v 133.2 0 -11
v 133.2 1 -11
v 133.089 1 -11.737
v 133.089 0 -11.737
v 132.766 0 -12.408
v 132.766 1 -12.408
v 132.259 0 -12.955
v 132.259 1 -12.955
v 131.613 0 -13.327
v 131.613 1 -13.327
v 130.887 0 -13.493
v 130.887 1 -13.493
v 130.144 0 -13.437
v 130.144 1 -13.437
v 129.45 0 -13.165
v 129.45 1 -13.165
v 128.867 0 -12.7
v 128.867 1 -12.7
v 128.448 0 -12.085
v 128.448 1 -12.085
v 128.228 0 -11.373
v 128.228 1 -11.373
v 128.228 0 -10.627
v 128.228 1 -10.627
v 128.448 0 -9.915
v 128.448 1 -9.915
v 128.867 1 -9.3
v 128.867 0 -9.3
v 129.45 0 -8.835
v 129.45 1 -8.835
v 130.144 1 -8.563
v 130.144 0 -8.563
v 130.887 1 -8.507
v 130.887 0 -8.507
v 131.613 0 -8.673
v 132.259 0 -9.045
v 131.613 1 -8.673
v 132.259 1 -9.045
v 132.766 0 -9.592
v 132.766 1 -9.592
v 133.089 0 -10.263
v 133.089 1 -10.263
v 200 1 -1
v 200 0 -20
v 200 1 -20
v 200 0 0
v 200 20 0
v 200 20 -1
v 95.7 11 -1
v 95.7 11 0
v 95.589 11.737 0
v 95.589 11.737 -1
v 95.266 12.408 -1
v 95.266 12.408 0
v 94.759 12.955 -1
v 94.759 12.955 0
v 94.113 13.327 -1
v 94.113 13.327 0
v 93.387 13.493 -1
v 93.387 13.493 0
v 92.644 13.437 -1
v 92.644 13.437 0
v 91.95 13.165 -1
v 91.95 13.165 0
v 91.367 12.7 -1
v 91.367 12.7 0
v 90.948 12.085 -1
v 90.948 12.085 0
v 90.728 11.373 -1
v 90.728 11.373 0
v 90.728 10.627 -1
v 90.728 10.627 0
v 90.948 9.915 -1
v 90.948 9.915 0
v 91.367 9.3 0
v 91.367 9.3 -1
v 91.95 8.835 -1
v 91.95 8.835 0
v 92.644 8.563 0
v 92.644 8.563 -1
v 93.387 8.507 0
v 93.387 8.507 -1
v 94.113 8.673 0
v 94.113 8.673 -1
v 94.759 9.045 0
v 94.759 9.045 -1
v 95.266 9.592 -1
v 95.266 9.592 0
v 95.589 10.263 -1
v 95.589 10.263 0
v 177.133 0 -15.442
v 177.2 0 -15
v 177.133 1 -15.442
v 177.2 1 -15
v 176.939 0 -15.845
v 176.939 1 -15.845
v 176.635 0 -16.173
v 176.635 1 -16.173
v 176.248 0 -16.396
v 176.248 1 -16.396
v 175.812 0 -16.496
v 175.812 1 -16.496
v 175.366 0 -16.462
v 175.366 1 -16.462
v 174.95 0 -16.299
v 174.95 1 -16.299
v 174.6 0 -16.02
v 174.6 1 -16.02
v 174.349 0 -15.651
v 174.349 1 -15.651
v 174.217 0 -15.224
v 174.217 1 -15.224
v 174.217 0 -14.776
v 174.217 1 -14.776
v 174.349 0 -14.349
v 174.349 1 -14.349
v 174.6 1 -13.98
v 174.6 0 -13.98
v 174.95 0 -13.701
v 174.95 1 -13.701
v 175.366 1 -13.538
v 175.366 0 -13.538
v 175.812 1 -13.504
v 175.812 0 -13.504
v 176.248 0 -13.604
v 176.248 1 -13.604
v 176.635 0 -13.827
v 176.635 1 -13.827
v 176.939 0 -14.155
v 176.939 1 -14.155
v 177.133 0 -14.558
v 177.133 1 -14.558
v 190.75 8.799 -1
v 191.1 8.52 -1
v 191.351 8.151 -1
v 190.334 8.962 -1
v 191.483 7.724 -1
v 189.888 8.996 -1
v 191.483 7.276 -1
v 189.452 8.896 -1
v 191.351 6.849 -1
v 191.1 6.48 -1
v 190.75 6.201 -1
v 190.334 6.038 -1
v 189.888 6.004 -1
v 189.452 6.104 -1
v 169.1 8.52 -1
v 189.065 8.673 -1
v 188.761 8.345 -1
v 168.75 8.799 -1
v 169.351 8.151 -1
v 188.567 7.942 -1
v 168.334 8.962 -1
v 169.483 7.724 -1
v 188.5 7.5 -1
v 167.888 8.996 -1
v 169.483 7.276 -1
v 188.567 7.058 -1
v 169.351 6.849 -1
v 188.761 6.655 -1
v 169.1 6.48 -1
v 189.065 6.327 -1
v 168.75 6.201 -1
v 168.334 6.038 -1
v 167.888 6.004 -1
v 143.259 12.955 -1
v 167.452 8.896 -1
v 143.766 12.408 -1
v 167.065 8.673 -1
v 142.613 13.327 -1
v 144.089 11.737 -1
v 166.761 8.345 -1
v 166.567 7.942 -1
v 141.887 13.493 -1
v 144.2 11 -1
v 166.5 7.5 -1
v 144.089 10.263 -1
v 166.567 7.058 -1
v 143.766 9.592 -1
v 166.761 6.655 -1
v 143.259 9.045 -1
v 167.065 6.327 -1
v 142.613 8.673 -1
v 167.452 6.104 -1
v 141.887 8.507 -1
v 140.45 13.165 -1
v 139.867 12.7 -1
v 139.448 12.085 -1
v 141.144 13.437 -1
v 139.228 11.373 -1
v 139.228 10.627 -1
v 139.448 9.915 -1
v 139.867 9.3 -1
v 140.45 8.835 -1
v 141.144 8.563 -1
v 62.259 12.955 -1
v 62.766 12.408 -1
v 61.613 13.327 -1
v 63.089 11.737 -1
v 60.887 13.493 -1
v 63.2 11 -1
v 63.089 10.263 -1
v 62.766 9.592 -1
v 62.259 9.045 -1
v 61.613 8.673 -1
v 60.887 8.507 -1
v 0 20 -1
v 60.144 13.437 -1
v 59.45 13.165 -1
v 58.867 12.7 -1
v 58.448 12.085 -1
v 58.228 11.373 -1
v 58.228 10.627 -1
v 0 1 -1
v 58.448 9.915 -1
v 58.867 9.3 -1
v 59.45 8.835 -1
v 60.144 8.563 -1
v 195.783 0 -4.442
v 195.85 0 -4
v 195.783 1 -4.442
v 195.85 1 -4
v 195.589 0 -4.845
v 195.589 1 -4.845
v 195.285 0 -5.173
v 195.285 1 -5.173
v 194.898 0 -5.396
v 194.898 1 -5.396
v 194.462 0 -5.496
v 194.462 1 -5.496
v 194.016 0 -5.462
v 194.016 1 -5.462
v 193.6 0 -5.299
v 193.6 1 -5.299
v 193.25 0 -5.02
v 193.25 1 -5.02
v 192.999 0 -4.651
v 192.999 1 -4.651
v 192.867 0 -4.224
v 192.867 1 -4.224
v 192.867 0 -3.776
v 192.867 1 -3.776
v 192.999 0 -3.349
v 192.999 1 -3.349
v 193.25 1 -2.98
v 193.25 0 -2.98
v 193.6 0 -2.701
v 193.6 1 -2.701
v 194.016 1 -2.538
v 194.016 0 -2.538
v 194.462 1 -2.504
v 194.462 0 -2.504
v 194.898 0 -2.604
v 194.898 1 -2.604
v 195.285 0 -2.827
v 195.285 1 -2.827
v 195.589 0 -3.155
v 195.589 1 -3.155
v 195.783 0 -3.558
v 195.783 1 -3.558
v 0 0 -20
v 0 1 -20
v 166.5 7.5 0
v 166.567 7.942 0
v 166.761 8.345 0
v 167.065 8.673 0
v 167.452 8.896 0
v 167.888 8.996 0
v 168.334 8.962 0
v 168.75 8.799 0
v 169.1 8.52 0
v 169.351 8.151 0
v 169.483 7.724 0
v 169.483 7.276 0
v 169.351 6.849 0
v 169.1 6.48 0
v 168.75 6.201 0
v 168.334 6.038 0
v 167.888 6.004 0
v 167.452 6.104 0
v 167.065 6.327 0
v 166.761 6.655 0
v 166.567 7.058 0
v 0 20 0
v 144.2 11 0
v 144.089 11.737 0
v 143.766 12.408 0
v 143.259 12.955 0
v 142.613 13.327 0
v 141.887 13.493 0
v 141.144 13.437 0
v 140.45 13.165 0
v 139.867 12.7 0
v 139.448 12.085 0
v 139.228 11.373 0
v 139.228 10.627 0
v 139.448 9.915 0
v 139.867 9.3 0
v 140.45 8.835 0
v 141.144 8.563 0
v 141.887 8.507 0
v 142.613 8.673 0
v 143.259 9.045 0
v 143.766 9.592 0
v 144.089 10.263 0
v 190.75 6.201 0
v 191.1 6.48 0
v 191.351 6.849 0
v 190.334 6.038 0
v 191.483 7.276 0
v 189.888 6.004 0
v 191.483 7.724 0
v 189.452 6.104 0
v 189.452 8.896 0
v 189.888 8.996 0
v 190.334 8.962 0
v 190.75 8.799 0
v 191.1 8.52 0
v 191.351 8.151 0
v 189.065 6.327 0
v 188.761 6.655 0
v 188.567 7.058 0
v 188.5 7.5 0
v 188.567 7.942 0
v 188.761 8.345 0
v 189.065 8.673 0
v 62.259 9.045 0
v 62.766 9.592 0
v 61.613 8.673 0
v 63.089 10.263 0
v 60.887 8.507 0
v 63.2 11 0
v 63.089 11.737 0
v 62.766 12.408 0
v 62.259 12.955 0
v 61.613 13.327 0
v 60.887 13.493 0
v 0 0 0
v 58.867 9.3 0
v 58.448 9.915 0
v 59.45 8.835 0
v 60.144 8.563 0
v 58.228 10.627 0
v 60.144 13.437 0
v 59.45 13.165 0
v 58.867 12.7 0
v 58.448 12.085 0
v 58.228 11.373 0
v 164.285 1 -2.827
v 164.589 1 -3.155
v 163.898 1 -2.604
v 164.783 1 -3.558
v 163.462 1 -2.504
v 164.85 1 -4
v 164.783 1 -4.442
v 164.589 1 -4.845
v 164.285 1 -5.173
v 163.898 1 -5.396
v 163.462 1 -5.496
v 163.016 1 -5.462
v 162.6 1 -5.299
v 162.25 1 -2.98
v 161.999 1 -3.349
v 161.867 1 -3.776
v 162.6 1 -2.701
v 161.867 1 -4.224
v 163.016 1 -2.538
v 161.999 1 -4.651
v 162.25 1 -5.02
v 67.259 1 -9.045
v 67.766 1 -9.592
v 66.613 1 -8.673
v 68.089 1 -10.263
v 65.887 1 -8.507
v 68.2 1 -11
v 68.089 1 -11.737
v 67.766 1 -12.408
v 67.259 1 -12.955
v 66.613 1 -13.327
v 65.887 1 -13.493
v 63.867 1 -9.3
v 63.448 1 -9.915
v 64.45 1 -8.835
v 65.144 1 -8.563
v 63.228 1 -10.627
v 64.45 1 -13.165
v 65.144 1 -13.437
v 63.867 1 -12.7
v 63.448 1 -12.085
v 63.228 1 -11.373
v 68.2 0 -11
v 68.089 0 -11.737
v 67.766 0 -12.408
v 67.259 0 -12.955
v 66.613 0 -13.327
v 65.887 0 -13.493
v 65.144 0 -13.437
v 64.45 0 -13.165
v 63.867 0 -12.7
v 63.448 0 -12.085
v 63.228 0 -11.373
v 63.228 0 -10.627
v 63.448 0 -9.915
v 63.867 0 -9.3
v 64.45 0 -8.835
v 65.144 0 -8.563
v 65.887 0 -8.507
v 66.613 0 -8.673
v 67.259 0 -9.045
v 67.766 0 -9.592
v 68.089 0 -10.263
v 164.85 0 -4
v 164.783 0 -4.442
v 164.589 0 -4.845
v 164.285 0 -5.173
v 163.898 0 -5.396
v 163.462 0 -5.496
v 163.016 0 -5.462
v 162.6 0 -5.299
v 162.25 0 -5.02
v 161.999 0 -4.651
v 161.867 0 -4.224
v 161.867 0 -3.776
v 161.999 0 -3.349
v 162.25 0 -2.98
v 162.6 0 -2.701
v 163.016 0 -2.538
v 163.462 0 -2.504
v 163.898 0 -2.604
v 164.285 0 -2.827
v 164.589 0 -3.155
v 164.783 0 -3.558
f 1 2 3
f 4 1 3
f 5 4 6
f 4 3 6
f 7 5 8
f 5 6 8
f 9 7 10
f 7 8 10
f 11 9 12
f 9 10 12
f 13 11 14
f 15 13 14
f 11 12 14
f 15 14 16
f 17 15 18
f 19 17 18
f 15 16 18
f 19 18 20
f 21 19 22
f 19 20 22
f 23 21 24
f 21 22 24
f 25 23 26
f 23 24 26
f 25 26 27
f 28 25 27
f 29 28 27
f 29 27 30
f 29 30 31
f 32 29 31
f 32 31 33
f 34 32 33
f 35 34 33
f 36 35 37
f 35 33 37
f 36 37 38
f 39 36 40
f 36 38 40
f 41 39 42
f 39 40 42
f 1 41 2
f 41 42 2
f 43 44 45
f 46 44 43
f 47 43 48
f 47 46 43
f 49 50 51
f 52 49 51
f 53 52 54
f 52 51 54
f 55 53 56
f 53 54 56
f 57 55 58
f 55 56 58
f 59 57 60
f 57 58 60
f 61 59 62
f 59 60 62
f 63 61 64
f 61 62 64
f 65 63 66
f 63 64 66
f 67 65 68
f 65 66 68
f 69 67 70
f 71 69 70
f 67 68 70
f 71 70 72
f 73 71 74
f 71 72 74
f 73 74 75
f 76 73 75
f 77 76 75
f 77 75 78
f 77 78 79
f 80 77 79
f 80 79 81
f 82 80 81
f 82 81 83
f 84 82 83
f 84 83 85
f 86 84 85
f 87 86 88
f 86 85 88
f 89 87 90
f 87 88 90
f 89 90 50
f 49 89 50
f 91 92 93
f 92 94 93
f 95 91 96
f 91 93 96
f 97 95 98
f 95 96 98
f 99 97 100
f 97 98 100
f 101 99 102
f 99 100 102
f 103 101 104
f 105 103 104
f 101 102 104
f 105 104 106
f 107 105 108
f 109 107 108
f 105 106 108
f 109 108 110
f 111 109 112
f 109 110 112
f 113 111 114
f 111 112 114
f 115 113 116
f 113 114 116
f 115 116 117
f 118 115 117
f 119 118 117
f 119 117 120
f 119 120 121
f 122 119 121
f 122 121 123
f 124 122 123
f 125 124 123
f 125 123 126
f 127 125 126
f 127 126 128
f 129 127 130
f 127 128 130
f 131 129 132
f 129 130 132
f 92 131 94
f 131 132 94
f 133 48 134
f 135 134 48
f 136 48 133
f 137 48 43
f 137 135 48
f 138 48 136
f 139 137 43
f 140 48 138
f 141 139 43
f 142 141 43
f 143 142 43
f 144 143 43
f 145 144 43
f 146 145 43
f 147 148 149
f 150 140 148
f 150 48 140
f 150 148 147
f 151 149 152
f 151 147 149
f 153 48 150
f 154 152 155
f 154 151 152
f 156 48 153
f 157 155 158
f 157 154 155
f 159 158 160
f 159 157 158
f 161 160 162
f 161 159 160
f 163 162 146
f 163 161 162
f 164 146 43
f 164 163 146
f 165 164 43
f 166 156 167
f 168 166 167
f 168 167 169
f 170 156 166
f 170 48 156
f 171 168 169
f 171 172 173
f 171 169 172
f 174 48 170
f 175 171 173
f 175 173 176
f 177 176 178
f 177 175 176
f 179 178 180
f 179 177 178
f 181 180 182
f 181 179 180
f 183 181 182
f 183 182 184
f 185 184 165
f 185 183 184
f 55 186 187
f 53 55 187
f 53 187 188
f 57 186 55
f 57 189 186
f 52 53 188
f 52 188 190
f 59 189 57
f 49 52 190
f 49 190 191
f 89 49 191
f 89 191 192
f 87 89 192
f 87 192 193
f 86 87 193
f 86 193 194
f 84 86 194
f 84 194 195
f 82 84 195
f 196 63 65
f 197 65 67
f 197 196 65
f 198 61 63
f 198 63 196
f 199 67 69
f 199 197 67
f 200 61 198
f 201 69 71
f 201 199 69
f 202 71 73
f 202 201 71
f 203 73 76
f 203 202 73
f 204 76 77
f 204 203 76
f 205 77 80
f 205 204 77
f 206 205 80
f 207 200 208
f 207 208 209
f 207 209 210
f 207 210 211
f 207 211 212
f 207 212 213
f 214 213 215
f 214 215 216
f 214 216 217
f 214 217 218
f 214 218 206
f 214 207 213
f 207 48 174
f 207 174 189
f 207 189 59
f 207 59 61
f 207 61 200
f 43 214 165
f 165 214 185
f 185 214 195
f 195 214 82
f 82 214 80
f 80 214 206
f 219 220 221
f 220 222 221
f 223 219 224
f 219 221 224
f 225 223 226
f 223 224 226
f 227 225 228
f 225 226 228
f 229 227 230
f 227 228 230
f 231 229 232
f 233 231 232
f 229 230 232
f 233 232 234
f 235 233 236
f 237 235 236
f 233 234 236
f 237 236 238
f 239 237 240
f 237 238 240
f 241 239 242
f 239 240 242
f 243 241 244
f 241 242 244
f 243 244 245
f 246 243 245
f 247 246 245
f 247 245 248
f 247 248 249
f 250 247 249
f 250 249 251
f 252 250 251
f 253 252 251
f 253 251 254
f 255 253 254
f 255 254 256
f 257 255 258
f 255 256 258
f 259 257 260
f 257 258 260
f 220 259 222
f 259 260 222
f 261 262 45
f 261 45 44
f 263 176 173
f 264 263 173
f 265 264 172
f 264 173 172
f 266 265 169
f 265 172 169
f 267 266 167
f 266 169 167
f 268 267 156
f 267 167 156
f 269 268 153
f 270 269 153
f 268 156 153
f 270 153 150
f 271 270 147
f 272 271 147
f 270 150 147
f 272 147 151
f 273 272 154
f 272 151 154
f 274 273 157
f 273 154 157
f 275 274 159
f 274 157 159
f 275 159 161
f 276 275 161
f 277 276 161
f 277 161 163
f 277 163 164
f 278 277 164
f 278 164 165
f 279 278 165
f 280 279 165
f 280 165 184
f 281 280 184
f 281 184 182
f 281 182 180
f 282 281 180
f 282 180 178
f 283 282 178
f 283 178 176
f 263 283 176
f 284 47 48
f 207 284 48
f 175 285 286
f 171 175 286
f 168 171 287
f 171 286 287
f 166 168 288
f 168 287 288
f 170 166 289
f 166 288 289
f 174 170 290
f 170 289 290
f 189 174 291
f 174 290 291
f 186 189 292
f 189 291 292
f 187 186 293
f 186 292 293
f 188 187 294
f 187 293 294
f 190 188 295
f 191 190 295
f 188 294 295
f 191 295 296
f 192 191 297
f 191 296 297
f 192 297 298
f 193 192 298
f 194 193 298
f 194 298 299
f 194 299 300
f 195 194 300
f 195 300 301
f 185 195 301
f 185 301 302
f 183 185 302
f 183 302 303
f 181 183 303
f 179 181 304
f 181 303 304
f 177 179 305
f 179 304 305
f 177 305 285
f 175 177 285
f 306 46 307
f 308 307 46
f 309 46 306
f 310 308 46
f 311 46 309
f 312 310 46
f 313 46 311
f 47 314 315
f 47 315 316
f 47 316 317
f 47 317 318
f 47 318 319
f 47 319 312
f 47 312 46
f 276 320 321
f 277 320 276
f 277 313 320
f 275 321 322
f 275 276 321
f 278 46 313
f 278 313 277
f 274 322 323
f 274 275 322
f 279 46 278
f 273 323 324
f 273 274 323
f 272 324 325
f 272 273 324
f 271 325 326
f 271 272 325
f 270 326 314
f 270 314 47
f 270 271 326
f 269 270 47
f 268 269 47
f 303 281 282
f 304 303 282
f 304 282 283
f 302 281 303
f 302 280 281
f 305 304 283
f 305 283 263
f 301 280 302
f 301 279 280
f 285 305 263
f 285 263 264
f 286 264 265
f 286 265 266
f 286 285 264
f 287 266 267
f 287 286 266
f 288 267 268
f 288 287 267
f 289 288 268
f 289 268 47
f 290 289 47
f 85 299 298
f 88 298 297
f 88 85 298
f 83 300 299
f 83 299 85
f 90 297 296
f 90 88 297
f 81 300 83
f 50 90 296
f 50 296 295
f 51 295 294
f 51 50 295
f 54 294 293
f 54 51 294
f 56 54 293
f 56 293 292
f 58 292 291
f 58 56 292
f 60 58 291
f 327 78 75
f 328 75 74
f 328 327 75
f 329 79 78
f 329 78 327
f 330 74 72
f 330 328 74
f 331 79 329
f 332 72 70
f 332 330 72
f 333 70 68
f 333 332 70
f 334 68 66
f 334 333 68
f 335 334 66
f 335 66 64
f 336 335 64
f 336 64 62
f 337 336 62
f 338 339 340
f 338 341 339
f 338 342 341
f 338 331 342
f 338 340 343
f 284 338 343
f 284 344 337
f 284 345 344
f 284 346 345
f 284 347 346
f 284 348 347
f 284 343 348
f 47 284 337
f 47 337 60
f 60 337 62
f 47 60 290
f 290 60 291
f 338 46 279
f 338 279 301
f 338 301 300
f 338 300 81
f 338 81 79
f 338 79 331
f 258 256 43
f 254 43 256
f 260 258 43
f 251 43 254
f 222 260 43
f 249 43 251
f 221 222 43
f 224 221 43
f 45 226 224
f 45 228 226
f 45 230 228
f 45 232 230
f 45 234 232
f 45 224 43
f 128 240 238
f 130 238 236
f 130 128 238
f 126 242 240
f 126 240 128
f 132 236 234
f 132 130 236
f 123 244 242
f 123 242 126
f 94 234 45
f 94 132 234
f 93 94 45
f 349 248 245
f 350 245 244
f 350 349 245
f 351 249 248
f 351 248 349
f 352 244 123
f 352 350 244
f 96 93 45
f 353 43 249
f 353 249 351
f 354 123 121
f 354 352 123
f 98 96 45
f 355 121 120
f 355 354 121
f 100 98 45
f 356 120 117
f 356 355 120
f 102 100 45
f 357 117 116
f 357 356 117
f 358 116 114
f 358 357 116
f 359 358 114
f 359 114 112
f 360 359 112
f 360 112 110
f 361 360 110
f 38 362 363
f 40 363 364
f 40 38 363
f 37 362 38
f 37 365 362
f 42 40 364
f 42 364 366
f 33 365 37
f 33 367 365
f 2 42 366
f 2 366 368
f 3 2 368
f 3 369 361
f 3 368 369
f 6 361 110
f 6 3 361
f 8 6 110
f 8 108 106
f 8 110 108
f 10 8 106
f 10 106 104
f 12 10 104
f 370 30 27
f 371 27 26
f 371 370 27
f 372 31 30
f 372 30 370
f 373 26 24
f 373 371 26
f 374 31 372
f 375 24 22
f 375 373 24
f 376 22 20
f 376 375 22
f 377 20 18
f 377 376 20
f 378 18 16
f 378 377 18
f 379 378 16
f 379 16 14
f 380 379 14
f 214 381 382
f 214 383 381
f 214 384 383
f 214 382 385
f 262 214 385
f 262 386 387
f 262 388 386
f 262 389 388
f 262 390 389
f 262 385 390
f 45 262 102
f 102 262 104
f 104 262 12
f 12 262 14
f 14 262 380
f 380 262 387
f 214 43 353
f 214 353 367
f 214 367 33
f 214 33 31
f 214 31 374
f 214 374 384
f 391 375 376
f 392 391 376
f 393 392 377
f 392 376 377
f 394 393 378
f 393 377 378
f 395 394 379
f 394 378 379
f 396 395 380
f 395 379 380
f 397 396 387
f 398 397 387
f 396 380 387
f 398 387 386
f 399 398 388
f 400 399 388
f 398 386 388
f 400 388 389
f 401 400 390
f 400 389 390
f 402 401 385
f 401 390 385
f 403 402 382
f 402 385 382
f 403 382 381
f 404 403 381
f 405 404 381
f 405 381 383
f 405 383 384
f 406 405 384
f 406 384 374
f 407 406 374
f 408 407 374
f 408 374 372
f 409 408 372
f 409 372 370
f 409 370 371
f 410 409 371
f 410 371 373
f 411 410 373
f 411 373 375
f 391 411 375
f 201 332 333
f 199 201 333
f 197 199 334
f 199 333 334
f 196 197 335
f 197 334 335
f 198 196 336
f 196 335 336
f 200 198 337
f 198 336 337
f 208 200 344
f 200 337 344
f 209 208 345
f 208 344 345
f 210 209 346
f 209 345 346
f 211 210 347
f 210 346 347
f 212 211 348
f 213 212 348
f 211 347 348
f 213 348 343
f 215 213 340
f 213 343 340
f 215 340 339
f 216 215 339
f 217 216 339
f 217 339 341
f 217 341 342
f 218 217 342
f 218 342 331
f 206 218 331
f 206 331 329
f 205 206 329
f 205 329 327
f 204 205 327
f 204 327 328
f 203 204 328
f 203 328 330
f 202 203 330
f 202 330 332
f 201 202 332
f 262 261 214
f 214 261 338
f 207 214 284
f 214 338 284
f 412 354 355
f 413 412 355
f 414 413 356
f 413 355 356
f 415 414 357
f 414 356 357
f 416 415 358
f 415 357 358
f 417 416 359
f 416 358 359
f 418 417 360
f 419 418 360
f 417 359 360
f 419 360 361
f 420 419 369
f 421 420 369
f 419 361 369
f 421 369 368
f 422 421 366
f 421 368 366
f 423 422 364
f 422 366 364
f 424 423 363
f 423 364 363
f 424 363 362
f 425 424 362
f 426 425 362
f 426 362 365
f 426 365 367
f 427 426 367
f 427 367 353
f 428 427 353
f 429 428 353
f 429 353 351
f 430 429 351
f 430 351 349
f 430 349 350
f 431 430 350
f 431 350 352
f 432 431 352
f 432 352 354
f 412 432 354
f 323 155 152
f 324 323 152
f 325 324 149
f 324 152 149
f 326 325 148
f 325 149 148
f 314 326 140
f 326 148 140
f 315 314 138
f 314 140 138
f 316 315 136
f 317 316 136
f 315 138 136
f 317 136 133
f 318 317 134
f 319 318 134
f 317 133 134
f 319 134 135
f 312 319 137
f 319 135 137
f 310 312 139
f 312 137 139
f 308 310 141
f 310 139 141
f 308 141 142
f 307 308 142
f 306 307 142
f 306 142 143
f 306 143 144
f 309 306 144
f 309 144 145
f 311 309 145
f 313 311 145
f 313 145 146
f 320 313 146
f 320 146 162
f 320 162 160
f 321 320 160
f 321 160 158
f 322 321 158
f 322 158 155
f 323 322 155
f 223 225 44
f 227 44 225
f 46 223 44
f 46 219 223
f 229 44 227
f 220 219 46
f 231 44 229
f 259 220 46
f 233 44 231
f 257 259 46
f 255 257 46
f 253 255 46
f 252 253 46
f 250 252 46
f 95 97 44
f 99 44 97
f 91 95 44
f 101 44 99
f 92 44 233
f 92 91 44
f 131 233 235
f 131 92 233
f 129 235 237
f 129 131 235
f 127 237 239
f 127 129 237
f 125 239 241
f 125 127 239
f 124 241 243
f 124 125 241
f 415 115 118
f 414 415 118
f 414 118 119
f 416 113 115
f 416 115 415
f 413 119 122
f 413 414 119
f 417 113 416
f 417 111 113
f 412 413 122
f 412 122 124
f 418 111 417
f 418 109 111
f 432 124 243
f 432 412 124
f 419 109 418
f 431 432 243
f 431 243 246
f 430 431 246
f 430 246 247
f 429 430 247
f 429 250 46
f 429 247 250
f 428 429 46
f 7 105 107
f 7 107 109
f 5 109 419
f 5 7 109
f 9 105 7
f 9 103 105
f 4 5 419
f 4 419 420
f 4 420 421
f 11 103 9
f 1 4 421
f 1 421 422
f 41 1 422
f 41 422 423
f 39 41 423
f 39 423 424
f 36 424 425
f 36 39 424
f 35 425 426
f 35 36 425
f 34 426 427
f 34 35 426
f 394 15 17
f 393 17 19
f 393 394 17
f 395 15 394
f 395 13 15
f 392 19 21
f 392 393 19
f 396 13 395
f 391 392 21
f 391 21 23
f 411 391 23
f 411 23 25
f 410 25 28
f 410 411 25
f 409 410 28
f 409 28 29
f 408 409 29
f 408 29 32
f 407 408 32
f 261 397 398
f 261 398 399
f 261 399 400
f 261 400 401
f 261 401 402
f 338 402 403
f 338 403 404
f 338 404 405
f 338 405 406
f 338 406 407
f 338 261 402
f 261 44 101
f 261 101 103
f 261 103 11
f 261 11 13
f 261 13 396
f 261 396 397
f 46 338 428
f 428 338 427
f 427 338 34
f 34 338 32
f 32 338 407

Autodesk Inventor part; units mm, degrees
ref_plane "YZ Plane" through (0, 0, 0) normal (1, 0, 0) x (0, 1, 0)
ref_plane "XZ Plane" through (0, 0, 0) normal (0, 1, 0) x (-1, 0, 0)
ref_plane "XY Plane" through (0, 0, 0) normal (0, 0, 1) x (1, 0, 0)
sketch "Boceto1" plane through (0, 0, 0) normal (1, 0, 0) x (0, 1, 0)
  line L0 (0, 0) -> (20, 0)
  line L1 (20, 0) -> (20, -1)
  line L2 (20, -1) -> (0, -1)
  line L3 (0, -1) -> (0, 0)
  line L4 (0, 0) -> (1, 0)
  line L5 (1, 0) -> (1, -20)
  line L6 (1, -20) -> (0, -20)
  line L7 (0, -20) -> (0, 0)
  point P0 (1, -1)
  dimension "d0" = 20
  dimension "d1" = 20
  dimension "d2" = 1
  dimension "d3" = 1
extrude "Extrusión1" add sketch "Boceto1" along normal blind 200
sketch "Boceto3" plane through (0, 1, -1) normal (0, 1, 0) x (1, 0, 0)
  circle A0 centre (194.35, 3) radius 1.5
  circle A1 centre (163.35, 3) radius 1.5
  line L0 (0, 19) -> (200, 19) projected
  line L1 (200, 19) -> (200, 0) projected
  line L2 (0, 0) -> (200, 0) projected
  point P0 (0, -1)
  dimension "d14" = 3
  dimension "d15" = 3
  dimension "d18" = 5.65
  dimension "d19" = 31
  dimension "d40" = 3
  dimension "d41" = 3
extrude "Extrusión3" cut sketch "Boceto3" against normal through all
sketch "Boceto4" plane through (0, 0, 0) normal (0, 0, 1) x (1, 0, 0)
  circle A0 centre (60.7, 11) radius 2.5
  line L0 (200, 20) -> (200, 0) projected
  circle A1 centre (93.2, 11) radius 2.5
  line L1 (0, 20) -> (200, 20) projected
  line L2 (0, 20) -> (0, 0) projected
  circle A2 centre (141.7, 11) radius 2.5
  dimension "d24" = 9
  dimension "d25" = 9
  dimension "d28" = 5
  dimension "d29" = 5
  dimension "d42" = 60.7
  dimension "d43" = 32.5
  dimension "d44" = 5
  dimension "d45" = 9
  dimension "d46" = 48.5
extrude "Extrusión4" cut sketch "Boceto4" against normal through all
sketch "Boceto5" plane through (0, 1, -1) normal (0, 1, 0) x (1, 0, 0)
  circle A0 centre (65.7, 10) radius 2.5
  line L0 (0, 19) -> (0, 0) projected
  circle A1 centre (130.7, 10) radius 2.5
  line L1 (0, 19) -> (200, 19) projected
  point P0 (0, -1)
  dimension "d30" = 5
  dimension "d32" = 65.7
  dimension "d33" = 5
  dimension "d39" = 65
  dimension "d62" = 9
  dimension "d63" = 9
extrude "Extrusión5" cut sketch "Boceto5" against normal through all
sketch "Boceto6" plane through (0, 1, -1) normal (0, 0, -1) x (-1, 0, 0)
  circle A0 centre (-190, 6.5) radius 1.5
  circle A1 centre (-168, 6.5) radius 1.5
  line L0 (-200, 0) -> (-200, 19) projected
  line L1 (0, 0) -> (-200, 0) projected
  point P0 (0, -1)
  dimension "d47" = 3
  dimension "d48" = 3
  dimension "d49" = 10
  dimension "d51" = 6.5
  dimension "d52" = 6.5
  dimension "d55" = 32
extrude "Extrusión6" cut sketch "Boceto6" against normal through all
sketch "Boceto7" plane through (0, 1, -1) normal (0, 1, 0) x (1, 0, 0)
  circle A0 centre (175.7, 14) radius 1.5
  line L0 (0, 0) -> (200, 0) projected
  line L1 (200, 19) -> (200, 0) projected
  line L2 (0, 19) -> (200, 19) projected
  point P0 (0, -1)
  dimension "d57" = 24.3
  dimension "d60" = 3
  dimension "d61" = 5
extrude "Extrusión7" cut sketch "Boceto7" against normal through all
equation "\"d1\" = d0"
equation "\"d3\" = d2"
equation "\"d15\" = d14"
equation "\"d41\" = d40"
equation "\"d24\" = d25"
equation "\"d29\" = d28"
equation "\"d44\" = d29"
equation "\"d45\" = d25"
equation "\"d33\" = d30"
equation "\"d63\" = d62"
equation "\"d48\" = d47"
equation "\"d52\" = d51"
properties part number "Angulo 2020x450" material "Madera (cerezo)"
